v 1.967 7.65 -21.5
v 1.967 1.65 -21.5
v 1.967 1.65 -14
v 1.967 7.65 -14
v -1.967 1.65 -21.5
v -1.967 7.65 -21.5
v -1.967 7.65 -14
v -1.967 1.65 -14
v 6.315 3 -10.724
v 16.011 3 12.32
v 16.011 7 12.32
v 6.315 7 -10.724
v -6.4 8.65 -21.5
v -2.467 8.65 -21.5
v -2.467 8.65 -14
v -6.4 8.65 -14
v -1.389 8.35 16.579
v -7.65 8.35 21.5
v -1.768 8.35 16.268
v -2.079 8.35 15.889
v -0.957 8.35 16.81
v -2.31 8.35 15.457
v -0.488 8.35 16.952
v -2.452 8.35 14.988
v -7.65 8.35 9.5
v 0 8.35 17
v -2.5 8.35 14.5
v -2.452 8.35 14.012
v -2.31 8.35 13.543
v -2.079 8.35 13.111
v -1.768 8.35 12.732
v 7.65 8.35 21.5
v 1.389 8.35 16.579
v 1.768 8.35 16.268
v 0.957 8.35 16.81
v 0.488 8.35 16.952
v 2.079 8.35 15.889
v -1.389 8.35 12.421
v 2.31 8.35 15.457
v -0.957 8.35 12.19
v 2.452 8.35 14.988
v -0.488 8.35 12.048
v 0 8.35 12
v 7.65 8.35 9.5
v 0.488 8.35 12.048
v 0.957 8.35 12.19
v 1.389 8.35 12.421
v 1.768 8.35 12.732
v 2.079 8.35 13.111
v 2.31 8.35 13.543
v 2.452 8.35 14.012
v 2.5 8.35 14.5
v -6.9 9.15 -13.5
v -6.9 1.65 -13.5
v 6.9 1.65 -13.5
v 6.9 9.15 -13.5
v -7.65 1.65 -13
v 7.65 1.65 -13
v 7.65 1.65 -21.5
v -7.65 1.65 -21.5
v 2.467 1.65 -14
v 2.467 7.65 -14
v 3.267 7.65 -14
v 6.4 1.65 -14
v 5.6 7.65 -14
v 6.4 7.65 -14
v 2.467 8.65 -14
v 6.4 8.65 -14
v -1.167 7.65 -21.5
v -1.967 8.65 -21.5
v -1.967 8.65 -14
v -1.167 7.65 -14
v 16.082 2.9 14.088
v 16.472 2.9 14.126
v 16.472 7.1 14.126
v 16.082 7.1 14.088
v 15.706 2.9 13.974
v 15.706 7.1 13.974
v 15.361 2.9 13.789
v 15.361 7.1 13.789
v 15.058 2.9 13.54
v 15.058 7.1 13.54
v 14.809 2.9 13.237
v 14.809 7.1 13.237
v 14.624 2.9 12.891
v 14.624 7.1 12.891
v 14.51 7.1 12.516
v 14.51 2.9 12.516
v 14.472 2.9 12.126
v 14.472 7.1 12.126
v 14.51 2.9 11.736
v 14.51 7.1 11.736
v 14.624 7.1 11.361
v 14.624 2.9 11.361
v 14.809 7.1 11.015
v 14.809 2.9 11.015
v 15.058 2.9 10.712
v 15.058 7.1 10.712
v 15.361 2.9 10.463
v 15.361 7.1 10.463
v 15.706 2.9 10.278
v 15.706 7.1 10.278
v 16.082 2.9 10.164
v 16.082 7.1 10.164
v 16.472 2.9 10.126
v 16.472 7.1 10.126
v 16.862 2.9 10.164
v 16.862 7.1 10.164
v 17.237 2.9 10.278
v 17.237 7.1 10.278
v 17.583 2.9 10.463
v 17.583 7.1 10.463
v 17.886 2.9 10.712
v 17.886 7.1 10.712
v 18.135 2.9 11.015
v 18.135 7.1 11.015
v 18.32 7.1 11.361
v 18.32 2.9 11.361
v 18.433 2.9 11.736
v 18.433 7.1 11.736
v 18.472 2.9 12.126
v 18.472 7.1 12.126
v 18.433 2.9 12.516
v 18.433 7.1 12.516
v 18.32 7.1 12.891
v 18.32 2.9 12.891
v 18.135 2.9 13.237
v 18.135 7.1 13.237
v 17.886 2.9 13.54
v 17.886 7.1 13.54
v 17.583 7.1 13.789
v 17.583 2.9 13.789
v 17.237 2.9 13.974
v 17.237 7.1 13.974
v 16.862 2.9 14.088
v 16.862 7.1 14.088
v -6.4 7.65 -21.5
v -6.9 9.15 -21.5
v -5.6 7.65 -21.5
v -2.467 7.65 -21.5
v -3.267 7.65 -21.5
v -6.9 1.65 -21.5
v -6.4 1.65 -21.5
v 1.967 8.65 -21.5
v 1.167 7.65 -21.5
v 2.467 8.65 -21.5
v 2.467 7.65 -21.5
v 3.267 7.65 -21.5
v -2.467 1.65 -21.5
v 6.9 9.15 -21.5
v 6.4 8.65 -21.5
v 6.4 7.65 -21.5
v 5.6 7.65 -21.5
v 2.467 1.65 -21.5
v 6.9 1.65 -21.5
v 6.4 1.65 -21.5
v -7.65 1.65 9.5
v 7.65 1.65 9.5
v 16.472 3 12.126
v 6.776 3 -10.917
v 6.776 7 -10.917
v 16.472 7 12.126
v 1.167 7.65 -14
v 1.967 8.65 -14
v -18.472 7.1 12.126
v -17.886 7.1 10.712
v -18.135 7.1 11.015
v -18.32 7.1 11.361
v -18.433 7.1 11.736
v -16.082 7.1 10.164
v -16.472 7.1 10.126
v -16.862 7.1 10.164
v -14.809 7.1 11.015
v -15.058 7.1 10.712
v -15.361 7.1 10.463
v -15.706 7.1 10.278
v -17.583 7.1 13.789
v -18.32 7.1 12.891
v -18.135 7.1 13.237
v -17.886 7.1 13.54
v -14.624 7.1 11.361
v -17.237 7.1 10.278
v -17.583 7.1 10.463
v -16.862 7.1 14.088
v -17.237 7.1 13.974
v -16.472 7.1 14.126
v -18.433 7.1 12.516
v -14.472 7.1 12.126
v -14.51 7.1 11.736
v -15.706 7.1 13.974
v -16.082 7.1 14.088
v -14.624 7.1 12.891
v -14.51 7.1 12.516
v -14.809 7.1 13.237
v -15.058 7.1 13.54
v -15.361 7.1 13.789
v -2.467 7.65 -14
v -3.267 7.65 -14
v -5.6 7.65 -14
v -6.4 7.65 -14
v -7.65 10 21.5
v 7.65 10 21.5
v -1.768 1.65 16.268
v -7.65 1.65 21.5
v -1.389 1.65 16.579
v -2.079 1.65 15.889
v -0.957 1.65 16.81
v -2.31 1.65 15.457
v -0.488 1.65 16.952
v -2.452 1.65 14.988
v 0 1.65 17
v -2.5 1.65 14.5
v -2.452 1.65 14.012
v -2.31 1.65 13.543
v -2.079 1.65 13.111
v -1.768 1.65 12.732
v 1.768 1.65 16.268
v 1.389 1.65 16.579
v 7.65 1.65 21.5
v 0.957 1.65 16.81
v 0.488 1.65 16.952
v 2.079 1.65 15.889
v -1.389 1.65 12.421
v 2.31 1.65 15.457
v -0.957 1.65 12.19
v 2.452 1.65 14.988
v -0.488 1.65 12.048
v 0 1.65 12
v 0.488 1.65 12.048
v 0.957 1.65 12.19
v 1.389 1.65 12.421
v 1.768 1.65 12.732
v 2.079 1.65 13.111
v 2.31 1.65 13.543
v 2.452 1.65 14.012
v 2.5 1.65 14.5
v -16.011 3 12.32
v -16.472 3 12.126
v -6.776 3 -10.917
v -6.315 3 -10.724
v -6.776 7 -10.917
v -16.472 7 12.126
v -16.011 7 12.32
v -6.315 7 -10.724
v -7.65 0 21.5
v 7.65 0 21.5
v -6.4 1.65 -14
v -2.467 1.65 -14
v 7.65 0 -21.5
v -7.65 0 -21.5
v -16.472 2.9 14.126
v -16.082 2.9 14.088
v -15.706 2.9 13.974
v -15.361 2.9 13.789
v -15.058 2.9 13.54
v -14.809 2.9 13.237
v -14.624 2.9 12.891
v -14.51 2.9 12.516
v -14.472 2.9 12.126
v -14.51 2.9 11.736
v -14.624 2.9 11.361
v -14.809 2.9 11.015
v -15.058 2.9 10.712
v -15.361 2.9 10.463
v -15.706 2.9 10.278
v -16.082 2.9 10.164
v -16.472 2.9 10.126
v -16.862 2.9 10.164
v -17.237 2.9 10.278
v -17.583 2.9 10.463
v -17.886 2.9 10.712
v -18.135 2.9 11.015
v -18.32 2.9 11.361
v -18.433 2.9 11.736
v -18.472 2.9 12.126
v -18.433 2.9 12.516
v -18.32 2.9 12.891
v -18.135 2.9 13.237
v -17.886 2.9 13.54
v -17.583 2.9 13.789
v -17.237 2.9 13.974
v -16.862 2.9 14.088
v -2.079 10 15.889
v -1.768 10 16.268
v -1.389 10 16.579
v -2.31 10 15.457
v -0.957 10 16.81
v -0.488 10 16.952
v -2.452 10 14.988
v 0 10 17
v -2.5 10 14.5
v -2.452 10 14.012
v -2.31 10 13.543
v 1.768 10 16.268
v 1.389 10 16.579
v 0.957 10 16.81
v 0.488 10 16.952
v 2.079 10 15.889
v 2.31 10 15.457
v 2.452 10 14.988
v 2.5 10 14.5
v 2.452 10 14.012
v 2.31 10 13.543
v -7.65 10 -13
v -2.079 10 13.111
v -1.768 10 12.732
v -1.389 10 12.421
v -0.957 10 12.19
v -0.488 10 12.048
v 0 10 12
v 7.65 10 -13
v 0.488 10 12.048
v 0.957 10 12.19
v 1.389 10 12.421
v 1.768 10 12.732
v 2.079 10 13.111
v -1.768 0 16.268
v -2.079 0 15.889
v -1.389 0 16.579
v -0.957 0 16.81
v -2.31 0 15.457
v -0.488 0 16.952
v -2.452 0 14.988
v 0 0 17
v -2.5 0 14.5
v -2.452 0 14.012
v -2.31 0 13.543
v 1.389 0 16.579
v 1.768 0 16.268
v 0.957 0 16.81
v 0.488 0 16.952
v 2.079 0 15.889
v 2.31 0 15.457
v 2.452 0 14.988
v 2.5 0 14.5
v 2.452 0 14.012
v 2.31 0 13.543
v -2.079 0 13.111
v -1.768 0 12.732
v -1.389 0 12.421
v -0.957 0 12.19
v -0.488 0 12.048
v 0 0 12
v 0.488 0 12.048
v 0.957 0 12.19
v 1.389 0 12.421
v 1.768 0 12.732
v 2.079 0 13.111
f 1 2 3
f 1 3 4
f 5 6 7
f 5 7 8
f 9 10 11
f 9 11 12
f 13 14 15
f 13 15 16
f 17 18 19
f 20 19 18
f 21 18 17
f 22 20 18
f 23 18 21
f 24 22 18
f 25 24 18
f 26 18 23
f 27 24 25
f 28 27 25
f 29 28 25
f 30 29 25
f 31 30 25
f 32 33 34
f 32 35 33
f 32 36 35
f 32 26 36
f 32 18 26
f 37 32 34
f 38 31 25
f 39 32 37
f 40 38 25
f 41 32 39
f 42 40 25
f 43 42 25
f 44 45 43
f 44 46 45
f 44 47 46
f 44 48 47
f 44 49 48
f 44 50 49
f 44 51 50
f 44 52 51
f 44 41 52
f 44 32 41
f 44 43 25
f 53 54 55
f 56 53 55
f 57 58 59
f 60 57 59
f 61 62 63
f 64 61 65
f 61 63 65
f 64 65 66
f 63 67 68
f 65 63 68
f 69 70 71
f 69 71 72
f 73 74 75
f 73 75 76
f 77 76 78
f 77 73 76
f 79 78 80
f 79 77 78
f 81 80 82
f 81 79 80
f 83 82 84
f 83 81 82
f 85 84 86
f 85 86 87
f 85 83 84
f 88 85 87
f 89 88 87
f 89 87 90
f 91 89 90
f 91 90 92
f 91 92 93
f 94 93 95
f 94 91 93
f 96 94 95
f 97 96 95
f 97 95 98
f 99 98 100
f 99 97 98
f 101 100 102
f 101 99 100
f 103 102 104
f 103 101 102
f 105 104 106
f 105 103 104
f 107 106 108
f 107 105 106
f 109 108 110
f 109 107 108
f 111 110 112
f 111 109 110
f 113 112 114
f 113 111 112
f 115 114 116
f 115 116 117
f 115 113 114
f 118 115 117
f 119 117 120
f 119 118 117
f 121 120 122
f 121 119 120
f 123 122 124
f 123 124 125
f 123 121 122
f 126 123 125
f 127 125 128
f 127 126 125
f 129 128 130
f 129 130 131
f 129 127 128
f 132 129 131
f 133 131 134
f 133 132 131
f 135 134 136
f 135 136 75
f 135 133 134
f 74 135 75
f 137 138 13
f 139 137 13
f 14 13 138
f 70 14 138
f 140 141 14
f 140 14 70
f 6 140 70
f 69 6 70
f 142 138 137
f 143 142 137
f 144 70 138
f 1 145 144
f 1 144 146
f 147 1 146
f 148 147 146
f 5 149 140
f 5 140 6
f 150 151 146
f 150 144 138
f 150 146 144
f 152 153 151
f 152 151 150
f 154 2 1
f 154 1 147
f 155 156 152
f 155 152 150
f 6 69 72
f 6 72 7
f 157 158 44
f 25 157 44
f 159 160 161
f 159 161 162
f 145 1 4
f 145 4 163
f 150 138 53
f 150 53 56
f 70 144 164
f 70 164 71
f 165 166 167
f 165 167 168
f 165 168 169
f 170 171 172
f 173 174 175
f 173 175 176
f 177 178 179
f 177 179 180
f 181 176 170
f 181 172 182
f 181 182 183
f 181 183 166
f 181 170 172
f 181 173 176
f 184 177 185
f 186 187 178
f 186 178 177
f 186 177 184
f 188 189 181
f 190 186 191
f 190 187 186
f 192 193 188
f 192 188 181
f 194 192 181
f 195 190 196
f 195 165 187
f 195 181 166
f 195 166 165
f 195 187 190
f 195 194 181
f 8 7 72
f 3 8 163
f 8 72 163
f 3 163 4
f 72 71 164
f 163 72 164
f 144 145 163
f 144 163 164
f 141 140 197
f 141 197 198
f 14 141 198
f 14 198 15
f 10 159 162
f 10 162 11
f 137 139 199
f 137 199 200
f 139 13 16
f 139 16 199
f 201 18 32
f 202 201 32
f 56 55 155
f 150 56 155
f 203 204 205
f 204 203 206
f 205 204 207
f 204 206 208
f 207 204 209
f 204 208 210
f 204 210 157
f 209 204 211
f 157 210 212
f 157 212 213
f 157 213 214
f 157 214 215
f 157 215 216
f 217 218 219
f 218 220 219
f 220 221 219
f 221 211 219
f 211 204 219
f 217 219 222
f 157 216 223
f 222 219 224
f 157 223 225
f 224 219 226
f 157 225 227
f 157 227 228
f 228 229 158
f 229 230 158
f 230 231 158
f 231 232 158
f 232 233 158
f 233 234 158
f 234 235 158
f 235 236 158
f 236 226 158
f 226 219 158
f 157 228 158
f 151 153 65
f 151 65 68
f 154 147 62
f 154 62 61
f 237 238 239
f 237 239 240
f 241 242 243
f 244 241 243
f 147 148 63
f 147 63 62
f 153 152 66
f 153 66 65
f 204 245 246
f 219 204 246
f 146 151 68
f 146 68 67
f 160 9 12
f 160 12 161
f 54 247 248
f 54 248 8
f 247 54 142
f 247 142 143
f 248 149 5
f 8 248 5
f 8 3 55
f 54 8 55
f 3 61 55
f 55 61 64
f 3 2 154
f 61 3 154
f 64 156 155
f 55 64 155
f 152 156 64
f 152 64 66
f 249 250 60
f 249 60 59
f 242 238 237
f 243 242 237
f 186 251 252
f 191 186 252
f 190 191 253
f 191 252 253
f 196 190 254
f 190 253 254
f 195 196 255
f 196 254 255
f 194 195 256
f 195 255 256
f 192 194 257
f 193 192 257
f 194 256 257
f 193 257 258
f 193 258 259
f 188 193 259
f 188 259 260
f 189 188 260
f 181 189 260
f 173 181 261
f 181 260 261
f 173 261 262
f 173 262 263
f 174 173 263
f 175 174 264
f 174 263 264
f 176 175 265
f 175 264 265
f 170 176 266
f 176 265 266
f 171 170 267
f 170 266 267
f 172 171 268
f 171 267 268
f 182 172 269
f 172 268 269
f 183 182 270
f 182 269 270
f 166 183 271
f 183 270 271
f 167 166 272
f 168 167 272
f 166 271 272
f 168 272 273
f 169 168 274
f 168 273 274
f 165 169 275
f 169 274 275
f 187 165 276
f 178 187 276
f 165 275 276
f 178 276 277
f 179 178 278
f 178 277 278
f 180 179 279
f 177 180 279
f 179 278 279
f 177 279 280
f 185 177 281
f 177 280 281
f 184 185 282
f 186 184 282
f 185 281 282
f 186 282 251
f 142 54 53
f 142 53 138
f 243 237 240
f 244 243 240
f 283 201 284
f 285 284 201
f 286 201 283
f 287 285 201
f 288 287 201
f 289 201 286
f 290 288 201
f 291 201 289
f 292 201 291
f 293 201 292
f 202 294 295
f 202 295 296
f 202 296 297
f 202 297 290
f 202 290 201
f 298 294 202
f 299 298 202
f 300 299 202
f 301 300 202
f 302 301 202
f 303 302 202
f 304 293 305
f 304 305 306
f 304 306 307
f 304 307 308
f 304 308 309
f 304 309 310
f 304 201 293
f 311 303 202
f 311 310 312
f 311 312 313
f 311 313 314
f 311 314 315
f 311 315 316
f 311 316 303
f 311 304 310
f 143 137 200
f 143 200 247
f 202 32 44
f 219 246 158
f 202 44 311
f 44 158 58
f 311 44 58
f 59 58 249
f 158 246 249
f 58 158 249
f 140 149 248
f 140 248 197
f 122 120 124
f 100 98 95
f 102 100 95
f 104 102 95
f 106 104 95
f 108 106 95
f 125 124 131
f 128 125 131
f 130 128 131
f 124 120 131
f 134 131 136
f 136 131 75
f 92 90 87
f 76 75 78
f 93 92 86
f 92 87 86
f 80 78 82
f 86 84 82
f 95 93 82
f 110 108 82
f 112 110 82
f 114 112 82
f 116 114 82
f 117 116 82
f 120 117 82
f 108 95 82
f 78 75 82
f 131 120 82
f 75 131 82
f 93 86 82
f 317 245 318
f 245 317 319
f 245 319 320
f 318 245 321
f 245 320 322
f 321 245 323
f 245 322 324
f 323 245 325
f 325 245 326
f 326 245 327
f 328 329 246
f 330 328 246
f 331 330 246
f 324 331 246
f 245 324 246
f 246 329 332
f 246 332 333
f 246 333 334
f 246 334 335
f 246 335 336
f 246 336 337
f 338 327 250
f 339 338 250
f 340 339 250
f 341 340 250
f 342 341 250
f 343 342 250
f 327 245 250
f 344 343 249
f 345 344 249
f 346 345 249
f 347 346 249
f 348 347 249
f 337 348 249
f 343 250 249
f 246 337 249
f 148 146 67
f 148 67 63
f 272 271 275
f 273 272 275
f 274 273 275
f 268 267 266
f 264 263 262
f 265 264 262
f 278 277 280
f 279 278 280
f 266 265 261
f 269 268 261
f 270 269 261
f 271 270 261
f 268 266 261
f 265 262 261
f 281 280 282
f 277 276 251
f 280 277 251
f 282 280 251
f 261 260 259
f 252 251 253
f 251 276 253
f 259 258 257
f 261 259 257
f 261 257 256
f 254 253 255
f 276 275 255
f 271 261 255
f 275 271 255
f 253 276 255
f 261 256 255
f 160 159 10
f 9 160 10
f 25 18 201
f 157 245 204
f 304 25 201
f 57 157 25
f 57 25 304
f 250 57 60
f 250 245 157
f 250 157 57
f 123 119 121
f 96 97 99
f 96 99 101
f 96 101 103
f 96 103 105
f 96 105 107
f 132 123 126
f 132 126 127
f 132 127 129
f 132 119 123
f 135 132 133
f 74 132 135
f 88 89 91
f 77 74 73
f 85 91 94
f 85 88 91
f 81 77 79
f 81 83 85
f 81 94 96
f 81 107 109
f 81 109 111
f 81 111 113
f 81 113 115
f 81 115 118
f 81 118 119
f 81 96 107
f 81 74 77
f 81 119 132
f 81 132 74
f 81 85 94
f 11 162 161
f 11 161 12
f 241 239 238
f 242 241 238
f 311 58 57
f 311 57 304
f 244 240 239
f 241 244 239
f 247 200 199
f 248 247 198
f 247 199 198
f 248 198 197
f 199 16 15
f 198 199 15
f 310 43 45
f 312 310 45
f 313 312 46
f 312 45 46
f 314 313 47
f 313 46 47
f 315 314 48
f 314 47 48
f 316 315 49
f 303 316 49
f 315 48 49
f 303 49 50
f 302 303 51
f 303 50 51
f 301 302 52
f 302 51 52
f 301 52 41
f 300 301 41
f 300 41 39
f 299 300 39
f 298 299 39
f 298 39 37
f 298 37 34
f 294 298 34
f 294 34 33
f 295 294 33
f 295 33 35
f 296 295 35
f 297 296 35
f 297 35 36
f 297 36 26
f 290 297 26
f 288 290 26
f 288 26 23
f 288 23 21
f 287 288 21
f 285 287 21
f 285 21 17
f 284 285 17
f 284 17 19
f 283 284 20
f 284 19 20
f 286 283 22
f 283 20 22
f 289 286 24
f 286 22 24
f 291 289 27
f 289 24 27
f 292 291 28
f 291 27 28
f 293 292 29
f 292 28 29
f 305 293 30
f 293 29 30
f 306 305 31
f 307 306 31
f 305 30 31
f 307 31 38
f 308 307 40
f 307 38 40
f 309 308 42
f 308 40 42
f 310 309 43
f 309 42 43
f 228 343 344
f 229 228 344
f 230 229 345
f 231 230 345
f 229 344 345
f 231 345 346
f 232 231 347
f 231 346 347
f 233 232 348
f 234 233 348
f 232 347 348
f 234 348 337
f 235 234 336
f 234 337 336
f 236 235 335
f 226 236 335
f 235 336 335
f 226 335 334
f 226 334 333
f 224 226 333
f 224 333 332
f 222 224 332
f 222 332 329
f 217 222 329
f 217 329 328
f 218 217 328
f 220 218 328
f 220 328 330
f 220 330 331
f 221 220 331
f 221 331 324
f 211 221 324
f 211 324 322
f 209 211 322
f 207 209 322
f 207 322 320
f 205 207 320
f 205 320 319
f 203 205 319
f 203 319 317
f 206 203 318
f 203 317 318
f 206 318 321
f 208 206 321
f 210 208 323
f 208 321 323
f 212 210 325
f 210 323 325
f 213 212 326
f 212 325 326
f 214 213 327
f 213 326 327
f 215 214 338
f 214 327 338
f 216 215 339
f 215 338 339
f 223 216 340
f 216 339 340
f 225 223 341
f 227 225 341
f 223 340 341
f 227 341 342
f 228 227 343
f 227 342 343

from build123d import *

# Parameters (mm, degrees)
SKETCH1_W                = 15.3
SKETCH1_H                = 43
BOSS_EXTRUDE1_DEPTH      = 10
SKETCH2_W                = 12
SKETCH2_H                = 6.7
SKETCH2_W_2              = 8.5
SKETCH2_H_2              = 8.35
CUT_EXTRUDE1_DEPTH       = 29.219496806
SKETCH3_W                = 13.8
SKETCH3_H                = 8
BOSS_EXTRUDE2_DEPTH      = 7.5
CUT_EXTRUDE2_DEPTH       = 7.5
LPATTERN1_COUNT          = 3
LPATTERN1_PITCH          = 4.433333333
BOSS_EXTRUDE3_DEPTH      = 4
BOSS_EXTRUDE4_DEPTH      = 4.1
BOSS_EXTRUDE4_DEPTH_BACK = 0.1
SKETCH7_R                = 2
SKETCH8_R                = 2.5
CUT_EXTRUDE3_DEPTH       = 31.057587225


with BuildPart() as part:
    # Sketch1 → Boss-Extrude1 (new body)
    with BuildSketch(Plane(origin=(0, 0, 0), x_dir=(1, 0, 0), z_dir=(0, 1, 0))):
        Rectangle(SKETCH1_W, SKETCH1_H)
    extrude(amount=BOSS_EXTRUDE1_DEPTH)

    # Sketch2 → Cut-Extrude1 (cut, through all)
    with BuildSketch(Plane(origin=(7.65, 0, 0), x_dir=(0, 0, -1), z_dir=(1, 0, 0))):
        with Locations((-15.5, 5)):
            Rectangle(SKETCH2_W, SKETCH2_H)
        with Locations((17.25, 5.825)):
            Rectangle(SKETCH2_W_2, SKETCH2_H_2)
    extrude(amount=-CUT_EXTRUDE1_DEPTH, mode=Mode.SUBTRACT)

    # Sketch8 → Cut-Extrude3 (cut, through all)
    with BuildSketch(Plane.XZ):
        with Locations(Location((0, 14.5, 0), (0, 0, 270))):
            Circle(SKETCH8_R)
    extrude(amount=-CUT_EXTRUDE3_DEPTH, mode=Mode.SUBTRACT)


with BuildPart() as body_2:
    # Sketch3 → Boss-Extrude2 (new body)
    with BuildSketch(Plane(origin=(0, 1.65, 0), x_dir=(1, 0, 0), z_dir=(0, 1, 0))):
        with Locations((0, 17.5)):
            Rectangle(SKETCH3_W, SKETCH3_H)
    extrude(amount=BOSS_EXTRUDE2_DEPTH)

    # Sketch4 → Cut-Extrude2 (cut)
    with BuildSketch(Plane(origin=(0, 0, -21.5), x_dir=(-1, 0, 0), z_dir=(0, 0, -1))):
        Polygon((-6.4, 1.65), (-6.4, 7.65), (-5.6, 7.65), (-6.3999967, 8.65), (-2.4666667, 8.65), (-3.2666667, 7.65), (-2.4666667, 7.65), (-2.4666667, 1.65), align=None)
    cut_extrude2 = extrude(amount=-CUT_EXTRUDE2_DEPTH, mode=Mode.SUBTRACT)

    # LPattern1: Cut-Extrude2 ×3
    with Locations(*[(-i * LPATTERN1_PITCH, 0, 0) for i in range(1, LPATTERN1_COUNT)]):
        add(cut_extrude2, mode=Mode.SUBTRACT)


with BuildPart() as body_3:
    # Sketch6 → Boss-Extrude3 (new body)
    with BuildSketch(Plane(origin=(0, 3, 0), x_dir=(1, 0, 0), z_dir=(0, 1, 0))):
        Polygon((-6.77634418, 10.917443401), (-16.471831252, -12.125940258), (-16.010963579, -12.319849999), (-6.315476506, 10.723533659), align=None)
    extrude(amount=BOSS_EXTRUDE3_DEPTH)


with BuildPart() as body_4:
    # Sketch7 → Boss-Extrude4 (new, two sides: drawn at the far end of the back side and taken through both)
    with BuildSketch(Plane(origin=(0, 3, 0), x_dir=(1, 0, 0), z_dir=(0, 1, 0)).offset(-BOSS_EXTRUDE4_DEPTH_BACK)):
        with Locations(Location((-16.471831252, -12.125940258, 0), (0, 0, 270))):
            Circle(SKETCH7_R)
    extrude(amount=BOSS_EXTRUDE4_DEPTH + BOSS_EXTRUDE4_DEPTH_BACK)


with BuildPart() as body_5:
    # Mirror1: mirrored copy
    add(body_4.part.mirror(Plane(origin=(0, 0, 0), x_dir=(0, 0, 1), z_dir=(1, 0, 0))))


with BuildPart() as body_6:
    # Mirror1 2: mirrored copy
    add(body_3.part.mirror(Plane(origin=(0, 0, 0), x_dir=(0, 0, 1), z_dir=(1, 0, 0))))


solid = Compound([part.part, body_2.part, body_3.part, body_4.part, body_5.part, body_6.part])
